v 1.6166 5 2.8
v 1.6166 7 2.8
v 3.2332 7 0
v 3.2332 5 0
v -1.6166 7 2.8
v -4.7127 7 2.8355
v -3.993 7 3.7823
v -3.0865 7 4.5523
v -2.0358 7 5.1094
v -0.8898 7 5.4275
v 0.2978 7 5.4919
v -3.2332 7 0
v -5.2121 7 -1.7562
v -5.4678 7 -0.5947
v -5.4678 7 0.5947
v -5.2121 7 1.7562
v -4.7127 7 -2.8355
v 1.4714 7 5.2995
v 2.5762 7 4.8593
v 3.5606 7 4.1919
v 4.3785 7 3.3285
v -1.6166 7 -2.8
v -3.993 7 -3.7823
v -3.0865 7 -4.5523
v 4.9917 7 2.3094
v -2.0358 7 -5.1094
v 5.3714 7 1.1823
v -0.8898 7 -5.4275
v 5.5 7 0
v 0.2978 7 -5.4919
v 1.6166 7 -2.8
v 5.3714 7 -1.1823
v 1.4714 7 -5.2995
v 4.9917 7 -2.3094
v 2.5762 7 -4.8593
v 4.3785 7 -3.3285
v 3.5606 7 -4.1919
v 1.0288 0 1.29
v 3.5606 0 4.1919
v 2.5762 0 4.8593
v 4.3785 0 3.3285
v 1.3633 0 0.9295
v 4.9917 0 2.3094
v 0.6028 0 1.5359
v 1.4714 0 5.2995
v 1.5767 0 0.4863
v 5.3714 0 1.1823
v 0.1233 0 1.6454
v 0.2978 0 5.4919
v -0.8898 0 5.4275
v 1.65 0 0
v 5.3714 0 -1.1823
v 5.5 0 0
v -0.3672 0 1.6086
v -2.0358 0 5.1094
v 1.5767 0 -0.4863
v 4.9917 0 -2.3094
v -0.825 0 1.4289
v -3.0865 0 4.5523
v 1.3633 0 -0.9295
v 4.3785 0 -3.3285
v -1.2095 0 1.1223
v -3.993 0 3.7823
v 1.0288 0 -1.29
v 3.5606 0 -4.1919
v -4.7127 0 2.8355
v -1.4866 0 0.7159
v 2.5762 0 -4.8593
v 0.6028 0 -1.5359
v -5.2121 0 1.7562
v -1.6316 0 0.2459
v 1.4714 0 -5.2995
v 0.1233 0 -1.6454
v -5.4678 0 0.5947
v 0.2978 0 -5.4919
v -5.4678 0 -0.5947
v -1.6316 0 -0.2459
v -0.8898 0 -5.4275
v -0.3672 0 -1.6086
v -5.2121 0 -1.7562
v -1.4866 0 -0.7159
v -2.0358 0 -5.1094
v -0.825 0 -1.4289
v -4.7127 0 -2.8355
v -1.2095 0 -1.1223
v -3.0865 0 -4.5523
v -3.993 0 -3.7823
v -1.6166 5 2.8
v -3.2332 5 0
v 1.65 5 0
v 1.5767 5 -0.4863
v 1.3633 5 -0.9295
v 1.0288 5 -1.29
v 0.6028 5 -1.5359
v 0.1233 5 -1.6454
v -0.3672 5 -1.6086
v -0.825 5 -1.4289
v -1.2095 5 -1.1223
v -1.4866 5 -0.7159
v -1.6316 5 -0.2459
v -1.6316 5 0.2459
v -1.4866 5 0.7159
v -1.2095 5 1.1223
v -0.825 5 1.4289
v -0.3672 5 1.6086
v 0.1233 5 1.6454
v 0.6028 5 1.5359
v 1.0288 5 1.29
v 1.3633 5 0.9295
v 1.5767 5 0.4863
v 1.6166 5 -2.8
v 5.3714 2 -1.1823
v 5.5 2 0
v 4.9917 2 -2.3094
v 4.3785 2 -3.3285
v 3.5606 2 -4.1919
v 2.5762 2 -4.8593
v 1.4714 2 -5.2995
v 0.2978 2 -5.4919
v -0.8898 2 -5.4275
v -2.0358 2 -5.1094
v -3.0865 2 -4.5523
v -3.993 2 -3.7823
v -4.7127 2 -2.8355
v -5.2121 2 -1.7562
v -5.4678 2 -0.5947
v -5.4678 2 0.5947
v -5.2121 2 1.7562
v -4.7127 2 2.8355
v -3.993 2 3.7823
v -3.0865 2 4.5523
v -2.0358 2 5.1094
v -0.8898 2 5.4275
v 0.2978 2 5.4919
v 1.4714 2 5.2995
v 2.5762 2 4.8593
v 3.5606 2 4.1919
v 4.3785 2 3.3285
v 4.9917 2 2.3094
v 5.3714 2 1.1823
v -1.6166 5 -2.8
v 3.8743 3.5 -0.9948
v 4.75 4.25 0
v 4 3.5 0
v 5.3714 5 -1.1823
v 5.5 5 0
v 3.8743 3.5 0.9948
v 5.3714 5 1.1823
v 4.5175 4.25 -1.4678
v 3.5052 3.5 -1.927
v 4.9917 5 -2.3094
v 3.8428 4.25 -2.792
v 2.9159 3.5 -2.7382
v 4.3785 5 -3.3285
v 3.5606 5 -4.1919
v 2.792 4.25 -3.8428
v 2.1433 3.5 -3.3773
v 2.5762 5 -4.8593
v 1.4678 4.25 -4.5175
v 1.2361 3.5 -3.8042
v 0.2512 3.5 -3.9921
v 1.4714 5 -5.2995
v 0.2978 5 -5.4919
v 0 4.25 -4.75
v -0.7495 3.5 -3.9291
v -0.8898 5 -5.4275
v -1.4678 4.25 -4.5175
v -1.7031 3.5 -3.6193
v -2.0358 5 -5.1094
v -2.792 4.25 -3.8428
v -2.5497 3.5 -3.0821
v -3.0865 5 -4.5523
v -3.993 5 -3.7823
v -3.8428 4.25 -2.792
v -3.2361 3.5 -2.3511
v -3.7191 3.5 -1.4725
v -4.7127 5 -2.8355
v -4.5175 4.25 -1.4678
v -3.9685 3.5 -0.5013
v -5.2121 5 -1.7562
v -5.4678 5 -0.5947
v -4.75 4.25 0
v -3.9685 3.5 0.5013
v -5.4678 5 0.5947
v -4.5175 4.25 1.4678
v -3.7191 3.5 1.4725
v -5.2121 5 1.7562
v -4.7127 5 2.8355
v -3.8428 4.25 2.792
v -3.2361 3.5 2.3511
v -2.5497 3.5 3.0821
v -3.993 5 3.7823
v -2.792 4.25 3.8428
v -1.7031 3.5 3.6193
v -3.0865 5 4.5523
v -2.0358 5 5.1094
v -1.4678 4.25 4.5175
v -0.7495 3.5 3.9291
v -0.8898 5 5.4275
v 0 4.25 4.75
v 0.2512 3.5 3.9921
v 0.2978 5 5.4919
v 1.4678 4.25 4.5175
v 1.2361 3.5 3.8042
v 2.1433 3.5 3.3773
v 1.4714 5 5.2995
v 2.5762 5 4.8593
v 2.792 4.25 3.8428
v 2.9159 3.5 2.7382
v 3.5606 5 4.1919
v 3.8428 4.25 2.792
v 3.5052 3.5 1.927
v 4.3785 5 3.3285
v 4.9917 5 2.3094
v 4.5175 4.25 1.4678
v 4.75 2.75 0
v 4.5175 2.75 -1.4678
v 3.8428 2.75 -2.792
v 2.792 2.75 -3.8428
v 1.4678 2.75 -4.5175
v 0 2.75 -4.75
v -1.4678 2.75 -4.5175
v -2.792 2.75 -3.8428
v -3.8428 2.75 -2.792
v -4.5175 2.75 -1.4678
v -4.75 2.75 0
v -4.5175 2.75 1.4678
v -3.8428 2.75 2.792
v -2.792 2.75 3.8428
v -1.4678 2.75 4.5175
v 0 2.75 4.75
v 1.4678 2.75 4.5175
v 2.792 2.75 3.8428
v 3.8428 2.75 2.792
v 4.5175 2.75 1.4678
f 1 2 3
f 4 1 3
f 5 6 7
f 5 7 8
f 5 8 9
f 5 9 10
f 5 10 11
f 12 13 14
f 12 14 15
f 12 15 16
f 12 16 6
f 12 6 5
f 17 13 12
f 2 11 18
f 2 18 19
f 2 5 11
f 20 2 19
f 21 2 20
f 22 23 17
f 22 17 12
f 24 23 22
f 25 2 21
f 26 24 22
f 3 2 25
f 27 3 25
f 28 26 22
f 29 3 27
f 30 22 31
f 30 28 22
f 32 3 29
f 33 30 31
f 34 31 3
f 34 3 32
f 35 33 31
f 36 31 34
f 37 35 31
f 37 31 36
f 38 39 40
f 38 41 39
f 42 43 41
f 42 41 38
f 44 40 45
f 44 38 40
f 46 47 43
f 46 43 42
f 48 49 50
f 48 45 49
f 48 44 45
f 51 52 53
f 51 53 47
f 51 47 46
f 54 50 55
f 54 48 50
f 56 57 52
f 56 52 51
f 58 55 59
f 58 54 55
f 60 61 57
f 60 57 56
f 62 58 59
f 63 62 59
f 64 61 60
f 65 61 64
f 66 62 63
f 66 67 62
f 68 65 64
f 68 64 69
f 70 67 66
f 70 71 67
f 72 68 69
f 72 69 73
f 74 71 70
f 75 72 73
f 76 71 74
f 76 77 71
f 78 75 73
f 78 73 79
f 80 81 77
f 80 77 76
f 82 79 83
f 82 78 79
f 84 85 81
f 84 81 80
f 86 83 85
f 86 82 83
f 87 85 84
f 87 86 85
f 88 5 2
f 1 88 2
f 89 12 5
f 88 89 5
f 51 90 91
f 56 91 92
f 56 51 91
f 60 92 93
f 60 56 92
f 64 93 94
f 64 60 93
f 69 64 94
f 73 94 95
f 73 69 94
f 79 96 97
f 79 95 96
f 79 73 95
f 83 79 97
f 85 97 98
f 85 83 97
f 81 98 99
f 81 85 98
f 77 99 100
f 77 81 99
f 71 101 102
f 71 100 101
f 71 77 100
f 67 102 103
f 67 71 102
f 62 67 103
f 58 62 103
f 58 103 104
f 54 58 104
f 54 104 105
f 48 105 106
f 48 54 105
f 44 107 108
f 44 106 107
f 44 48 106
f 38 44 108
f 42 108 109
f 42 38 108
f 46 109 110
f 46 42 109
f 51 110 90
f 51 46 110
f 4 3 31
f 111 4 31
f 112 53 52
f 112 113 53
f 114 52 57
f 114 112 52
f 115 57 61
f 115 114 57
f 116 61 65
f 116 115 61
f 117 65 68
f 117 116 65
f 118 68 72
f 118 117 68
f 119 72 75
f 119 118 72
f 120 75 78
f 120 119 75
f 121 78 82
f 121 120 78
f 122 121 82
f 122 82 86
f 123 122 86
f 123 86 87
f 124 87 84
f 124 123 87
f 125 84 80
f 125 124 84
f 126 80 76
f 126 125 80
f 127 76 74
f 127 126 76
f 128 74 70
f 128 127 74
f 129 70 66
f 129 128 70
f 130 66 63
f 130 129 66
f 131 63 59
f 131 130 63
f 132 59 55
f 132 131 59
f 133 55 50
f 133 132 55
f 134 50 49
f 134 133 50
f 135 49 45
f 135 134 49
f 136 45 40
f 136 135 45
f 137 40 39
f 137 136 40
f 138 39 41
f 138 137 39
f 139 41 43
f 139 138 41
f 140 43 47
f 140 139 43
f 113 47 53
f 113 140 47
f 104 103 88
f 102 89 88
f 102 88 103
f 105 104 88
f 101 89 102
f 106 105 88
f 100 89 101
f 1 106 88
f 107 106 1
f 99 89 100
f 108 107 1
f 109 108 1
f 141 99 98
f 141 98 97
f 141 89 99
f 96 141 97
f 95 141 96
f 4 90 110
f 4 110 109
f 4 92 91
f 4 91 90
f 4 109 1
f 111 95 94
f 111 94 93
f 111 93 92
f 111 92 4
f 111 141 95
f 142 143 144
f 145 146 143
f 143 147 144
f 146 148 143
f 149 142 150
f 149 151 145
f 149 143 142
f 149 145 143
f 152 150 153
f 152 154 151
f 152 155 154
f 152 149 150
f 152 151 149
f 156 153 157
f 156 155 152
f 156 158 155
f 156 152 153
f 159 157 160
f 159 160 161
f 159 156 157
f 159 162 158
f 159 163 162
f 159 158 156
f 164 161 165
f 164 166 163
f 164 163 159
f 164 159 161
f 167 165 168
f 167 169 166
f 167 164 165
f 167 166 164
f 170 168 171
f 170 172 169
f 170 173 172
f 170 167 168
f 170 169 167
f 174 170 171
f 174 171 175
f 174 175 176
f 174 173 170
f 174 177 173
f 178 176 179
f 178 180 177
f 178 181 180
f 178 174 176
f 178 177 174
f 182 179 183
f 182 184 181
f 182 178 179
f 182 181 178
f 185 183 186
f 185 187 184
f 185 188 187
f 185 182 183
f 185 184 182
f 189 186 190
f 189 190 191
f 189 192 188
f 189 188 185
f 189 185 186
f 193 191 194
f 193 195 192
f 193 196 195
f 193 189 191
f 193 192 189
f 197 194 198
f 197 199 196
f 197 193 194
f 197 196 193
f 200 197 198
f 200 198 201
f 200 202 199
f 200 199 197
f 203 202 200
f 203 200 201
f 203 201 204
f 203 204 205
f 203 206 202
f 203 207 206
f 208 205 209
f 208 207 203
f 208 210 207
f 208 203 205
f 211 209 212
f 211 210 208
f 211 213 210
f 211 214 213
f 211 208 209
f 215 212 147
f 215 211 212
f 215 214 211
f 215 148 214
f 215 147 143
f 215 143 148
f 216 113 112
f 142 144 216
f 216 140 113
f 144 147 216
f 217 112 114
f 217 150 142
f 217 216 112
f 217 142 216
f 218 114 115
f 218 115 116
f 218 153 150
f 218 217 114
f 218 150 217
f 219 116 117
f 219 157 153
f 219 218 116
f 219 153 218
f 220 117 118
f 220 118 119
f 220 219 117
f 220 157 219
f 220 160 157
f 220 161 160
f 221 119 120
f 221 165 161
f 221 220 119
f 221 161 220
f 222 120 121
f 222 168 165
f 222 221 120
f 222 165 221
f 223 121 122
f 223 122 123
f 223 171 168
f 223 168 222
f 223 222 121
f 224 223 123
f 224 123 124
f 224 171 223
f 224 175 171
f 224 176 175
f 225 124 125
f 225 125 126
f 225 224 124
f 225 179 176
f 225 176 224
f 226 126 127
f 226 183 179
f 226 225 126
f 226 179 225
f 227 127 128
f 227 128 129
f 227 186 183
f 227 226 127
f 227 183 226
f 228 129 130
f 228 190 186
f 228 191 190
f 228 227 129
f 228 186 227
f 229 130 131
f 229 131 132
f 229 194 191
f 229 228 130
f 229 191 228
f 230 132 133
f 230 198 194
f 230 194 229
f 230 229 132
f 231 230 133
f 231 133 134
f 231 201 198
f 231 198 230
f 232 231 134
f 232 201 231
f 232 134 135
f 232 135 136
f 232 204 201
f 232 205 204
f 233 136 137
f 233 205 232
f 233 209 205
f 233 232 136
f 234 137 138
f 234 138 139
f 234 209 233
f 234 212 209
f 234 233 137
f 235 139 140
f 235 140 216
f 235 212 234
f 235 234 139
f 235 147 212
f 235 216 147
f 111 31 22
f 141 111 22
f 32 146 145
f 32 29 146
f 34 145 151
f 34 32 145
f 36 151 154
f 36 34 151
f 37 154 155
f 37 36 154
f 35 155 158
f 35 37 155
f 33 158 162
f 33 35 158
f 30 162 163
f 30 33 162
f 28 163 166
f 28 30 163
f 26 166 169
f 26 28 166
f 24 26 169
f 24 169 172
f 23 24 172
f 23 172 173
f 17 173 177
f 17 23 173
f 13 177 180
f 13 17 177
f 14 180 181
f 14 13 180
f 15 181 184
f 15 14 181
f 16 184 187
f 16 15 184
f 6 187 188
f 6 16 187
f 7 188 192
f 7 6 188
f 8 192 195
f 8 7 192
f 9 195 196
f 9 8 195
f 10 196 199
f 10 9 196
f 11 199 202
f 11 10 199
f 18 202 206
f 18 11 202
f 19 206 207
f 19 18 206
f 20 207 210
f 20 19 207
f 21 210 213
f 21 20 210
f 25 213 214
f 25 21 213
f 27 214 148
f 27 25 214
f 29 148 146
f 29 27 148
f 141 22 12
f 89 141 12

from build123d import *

# Parameters (mm, degrees)
CORTE_EXTRUS_O1_DEPTH = 2


with BuildPart() as part:
    # Esboço1 → Revolução1 (revolve)
    with BuildSketch(Plane.XY):
        Polygon((1.65, 0), (5.5, 0), (5.5, 2), (4, 3.5), (5.5, 5), (5.5, 7), (1.65, 7), align=None)
    revolve(axis=Axis((0, 0, 0), (0, 1, 0)))

    # Esboço2 → Corte-extrusão1 (cut)
    with BuildSketch(Plane(origin=(0, 7, 0), x_dir=(1, 0, 0), z_dir=(0, 1, 0))):
        Polygon((3.233161507, 0), (1.616580754, 2.8), (-1.616580754, 2.8), (-3.233161507, 0), (-1.616580754, -2.8), (1.616580754, -2.8), align=None)
    extrude(amount=-CORTE_EXTRUS_O1_DEPTH, mode=Mode.SUBTRACT)


solid = part.part
